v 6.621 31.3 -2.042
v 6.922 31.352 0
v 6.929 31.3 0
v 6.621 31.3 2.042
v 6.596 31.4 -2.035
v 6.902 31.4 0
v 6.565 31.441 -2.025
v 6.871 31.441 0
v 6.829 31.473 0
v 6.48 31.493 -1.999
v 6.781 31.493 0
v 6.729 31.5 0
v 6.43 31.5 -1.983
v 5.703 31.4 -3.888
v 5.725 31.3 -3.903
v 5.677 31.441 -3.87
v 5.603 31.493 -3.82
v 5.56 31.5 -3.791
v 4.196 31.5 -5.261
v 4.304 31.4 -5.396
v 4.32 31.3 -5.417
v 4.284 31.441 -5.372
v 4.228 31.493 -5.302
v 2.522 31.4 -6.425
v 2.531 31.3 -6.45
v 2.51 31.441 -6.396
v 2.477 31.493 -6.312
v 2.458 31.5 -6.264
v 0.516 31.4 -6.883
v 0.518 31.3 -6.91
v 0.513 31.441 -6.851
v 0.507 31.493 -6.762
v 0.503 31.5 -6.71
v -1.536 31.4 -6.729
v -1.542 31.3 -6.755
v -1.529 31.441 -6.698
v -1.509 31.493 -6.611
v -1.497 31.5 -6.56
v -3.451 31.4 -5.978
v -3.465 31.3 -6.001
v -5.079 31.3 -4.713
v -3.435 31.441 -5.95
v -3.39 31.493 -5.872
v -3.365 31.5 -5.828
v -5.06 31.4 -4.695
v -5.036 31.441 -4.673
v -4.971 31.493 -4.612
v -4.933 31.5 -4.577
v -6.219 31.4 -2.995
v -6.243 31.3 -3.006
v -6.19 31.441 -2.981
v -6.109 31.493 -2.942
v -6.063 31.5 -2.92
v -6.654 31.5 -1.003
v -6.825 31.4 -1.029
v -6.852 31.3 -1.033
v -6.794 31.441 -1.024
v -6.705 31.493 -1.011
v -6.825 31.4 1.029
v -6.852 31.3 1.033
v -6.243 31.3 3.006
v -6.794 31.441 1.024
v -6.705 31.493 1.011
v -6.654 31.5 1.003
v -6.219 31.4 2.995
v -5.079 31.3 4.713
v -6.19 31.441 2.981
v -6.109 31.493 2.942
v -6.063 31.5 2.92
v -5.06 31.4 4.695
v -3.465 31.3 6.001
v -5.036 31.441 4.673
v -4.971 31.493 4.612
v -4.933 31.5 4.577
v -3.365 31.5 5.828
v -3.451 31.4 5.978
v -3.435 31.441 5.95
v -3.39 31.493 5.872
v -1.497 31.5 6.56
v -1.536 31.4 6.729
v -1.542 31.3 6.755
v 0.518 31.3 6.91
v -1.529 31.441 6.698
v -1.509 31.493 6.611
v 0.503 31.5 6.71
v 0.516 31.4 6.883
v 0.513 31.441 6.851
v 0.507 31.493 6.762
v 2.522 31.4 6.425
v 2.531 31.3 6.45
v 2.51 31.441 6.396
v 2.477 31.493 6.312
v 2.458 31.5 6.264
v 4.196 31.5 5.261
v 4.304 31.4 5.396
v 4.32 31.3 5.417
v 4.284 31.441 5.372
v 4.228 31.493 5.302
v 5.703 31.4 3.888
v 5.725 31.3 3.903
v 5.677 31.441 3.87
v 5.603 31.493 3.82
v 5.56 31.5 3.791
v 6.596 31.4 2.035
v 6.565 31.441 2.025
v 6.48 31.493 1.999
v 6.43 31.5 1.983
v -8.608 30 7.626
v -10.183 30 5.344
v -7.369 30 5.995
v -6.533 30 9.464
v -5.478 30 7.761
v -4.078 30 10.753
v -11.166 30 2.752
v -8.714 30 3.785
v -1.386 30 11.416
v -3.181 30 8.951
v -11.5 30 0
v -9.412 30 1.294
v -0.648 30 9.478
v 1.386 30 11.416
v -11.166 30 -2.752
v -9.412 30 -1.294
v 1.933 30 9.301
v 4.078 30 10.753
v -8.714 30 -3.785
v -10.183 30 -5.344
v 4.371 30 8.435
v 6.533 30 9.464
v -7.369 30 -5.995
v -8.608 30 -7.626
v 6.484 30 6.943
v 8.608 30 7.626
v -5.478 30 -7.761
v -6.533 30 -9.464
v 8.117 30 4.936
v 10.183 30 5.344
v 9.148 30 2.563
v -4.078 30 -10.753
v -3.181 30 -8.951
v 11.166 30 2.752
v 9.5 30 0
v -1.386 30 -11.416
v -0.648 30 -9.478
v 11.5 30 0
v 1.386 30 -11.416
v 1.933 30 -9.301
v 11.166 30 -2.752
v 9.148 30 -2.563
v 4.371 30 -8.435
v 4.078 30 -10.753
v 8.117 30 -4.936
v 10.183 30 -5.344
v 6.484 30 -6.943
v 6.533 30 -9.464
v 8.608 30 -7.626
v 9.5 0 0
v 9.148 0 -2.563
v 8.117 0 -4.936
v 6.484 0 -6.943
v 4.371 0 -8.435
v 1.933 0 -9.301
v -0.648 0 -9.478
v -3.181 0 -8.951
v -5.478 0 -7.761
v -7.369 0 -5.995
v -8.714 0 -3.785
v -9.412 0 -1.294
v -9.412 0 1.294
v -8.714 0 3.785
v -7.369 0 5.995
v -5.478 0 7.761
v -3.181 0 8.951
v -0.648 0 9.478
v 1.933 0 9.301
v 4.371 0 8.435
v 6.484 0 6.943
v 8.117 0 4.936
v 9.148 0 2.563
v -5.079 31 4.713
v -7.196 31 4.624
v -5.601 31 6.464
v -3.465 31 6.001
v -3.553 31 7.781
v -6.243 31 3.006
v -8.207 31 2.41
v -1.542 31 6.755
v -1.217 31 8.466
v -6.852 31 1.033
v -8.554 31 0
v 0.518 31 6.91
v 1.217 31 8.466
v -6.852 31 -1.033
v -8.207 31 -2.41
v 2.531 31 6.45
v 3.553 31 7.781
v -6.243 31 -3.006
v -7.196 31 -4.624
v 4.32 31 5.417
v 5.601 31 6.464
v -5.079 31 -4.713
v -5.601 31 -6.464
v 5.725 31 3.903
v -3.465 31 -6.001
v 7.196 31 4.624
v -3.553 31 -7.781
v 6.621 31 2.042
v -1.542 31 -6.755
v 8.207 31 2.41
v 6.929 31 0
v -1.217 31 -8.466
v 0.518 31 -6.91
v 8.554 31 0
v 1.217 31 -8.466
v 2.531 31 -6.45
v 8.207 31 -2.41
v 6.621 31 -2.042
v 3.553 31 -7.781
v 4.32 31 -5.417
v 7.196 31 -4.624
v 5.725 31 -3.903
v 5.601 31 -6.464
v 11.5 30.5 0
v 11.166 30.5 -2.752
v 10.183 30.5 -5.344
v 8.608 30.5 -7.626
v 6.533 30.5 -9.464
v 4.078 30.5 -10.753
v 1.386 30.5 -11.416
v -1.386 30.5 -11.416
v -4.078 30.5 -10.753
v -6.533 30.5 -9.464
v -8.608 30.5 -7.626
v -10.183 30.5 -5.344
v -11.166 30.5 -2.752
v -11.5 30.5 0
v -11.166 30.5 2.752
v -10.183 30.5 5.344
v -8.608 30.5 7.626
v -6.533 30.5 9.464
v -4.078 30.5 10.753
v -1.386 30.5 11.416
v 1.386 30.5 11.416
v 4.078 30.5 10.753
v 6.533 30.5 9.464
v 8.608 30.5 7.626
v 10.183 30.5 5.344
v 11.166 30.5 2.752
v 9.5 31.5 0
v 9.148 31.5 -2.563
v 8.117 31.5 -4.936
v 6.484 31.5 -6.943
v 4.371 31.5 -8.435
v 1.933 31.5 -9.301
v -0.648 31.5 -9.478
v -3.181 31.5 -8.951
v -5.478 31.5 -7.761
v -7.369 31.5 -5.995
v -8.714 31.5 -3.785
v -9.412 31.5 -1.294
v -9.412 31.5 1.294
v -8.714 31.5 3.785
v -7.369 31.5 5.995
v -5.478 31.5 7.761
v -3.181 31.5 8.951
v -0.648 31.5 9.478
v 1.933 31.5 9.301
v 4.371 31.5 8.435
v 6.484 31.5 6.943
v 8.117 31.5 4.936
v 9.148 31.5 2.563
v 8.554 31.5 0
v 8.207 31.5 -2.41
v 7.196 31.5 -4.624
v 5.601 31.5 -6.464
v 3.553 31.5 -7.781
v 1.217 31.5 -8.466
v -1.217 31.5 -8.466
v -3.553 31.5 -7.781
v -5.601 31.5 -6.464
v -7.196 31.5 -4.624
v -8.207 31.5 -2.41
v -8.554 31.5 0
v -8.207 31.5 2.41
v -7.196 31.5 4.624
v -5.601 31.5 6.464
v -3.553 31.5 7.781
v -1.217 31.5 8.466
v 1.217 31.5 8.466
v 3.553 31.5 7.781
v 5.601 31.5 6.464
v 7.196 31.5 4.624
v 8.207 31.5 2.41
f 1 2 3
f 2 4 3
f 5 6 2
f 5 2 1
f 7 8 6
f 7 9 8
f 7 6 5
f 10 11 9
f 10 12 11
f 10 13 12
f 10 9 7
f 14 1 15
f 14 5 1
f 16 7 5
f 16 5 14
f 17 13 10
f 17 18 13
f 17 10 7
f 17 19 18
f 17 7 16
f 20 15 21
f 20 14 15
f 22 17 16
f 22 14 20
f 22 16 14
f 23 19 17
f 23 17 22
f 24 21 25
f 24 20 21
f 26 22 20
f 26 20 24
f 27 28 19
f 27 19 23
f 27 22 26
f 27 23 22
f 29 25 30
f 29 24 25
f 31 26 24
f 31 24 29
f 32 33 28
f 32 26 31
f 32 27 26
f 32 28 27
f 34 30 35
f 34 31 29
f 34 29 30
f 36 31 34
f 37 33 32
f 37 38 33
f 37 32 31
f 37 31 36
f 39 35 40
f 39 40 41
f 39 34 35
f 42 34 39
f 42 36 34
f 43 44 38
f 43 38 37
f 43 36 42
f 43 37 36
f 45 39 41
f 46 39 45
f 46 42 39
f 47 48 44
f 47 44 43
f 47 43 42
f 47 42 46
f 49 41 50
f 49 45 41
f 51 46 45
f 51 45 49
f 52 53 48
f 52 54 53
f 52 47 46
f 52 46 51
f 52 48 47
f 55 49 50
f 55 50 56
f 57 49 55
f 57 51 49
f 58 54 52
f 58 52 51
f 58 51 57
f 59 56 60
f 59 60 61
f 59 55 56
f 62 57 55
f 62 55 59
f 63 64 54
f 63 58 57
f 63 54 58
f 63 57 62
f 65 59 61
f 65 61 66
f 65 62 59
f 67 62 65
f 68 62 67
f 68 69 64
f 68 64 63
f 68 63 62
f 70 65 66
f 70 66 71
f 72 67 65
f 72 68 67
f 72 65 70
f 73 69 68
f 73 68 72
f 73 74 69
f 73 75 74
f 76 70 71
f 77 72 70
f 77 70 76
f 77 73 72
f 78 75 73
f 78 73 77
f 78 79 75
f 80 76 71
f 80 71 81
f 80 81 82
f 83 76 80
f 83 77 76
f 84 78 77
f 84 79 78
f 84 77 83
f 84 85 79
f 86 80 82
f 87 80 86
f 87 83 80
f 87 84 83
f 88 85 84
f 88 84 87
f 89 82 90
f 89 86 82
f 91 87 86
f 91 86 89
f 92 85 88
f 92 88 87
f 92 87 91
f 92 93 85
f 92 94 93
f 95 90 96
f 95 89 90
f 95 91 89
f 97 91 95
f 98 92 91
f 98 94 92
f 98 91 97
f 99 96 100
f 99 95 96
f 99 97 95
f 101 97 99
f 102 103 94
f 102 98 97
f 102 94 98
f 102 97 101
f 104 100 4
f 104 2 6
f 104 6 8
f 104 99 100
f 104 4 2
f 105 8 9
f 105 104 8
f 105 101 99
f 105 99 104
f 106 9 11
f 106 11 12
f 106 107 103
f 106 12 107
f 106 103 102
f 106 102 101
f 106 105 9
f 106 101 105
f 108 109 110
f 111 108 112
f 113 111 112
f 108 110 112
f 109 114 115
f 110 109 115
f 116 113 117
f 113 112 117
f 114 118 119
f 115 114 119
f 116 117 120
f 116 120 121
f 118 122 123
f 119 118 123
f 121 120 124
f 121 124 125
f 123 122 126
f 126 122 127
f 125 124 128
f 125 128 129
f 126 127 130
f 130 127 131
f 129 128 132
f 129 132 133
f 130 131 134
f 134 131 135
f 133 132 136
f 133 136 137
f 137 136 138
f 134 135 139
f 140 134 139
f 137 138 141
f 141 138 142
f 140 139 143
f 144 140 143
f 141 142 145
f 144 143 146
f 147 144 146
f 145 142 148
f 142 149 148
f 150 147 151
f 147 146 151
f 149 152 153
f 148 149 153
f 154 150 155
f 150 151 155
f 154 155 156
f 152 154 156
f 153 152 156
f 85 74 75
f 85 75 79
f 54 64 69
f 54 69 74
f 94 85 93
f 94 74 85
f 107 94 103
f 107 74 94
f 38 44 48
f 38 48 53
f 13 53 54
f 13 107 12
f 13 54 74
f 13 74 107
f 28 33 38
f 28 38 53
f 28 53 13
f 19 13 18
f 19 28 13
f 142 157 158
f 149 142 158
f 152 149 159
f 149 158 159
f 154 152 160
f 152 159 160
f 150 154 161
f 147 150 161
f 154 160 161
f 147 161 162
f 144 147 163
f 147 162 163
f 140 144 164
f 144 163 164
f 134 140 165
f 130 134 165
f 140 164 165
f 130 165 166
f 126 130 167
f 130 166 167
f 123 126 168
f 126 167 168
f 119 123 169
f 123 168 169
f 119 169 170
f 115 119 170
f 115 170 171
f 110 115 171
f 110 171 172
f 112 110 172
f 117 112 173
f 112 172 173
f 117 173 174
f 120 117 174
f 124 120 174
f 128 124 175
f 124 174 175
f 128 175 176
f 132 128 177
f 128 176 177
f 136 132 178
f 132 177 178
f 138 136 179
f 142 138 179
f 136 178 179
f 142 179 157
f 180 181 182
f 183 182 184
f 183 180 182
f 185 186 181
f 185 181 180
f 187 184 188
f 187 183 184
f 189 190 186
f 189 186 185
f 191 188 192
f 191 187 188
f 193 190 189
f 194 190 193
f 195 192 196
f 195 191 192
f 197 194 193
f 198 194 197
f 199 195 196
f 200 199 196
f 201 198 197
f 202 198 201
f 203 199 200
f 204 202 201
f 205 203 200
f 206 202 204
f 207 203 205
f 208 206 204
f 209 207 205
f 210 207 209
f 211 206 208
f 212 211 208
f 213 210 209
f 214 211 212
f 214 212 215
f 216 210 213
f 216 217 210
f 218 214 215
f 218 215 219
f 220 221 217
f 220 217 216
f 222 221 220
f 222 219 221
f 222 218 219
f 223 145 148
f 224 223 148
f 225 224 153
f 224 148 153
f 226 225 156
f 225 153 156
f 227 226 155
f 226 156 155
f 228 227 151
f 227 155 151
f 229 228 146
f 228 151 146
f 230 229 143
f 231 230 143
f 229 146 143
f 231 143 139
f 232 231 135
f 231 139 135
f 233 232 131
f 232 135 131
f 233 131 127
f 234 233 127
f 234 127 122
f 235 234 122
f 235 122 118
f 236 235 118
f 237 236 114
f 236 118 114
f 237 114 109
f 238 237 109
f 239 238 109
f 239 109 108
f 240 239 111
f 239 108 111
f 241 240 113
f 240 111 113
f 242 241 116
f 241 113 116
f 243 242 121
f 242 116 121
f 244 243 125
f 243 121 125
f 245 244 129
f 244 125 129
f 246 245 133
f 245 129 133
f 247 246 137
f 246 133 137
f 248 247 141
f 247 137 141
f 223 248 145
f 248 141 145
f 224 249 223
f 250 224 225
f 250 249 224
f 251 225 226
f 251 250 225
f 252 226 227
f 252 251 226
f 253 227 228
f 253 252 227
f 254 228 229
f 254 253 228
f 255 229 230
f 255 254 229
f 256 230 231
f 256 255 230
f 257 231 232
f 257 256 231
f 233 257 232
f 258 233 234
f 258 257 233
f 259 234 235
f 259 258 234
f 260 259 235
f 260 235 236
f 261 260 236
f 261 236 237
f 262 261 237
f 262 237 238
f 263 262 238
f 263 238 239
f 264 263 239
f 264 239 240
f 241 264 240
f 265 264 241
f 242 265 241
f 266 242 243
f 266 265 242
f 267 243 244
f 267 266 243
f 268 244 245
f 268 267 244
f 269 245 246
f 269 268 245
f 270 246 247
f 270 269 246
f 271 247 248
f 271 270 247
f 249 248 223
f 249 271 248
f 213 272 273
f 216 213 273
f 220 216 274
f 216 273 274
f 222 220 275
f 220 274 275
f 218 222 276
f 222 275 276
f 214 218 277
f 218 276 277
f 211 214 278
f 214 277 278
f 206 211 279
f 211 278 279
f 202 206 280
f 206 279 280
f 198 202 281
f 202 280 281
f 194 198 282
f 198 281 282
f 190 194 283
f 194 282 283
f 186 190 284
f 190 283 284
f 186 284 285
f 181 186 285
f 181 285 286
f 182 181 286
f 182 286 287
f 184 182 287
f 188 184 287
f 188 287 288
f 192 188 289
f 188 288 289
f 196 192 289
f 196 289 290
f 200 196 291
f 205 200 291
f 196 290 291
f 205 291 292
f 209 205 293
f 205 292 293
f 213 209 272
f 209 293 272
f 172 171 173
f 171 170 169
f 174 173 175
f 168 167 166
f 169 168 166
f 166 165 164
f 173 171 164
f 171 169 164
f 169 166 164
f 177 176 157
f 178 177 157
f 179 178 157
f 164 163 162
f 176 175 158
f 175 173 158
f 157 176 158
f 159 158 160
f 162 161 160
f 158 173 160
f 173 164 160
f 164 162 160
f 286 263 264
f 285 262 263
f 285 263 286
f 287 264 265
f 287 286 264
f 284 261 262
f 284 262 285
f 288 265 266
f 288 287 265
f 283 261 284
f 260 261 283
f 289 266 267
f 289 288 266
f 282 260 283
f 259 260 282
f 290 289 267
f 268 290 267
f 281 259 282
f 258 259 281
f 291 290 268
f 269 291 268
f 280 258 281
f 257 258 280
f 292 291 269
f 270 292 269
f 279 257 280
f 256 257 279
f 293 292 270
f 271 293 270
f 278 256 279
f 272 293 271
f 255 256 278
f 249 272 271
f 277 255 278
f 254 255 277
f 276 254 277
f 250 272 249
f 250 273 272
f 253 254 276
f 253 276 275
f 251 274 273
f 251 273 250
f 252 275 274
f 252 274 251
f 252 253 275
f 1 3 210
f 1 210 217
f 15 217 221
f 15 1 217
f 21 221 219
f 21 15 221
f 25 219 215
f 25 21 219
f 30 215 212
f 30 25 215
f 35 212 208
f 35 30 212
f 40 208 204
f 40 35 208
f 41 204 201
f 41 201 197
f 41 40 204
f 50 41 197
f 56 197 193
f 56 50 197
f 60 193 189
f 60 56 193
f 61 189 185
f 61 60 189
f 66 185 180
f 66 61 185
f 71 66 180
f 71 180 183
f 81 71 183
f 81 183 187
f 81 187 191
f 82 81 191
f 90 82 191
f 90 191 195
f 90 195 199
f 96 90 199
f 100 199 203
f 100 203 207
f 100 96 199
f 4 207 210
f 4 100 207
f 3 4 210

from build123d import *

# Parameters (mm, degrees)
SKETCH_1_R          = 9.5
EXTRUDE_1_DEPTH     = 30
SKETCH_2_R          = 11.5
EXTRUDE_2_DEPTH     = 1.5
CHAMFER_1_SIZE      = 1
CHAMFER_1_SIZE2     = 2
SKETCH_3_R          = 8.553523617
SKETCH_3_R_2        = 6.929138855
CUT_EXTRUDE_1_DEPTH = 0.5
FILLET_1_R          = 0.2


with BuildPart() as part:
    # 草图1 → 凸台-拉伸1 (new body)
    with BuildSketch(Plane(origin=(0, 0, 0), x_dir=(1, 0, 0), z_dir=(0, 1, 0))):
        Circle(SKETCH_1_R)
    extrude(amount=EXTRUDE_1_DEPTH)

    # 草图2 → 凸台-拉伸2 (add)
    with BuildSketch(Plane(origin=(0, 30, 0), x_dir=(1, 0, 0), z_dir=(0, 1, 0))):
        Circle(SKETCH_2_R)
    extrude(amount=EXTRUDE_2_DEPTH)

    # 倒角1
    chamfer_1_edges = [part.edges().sort_by_distance(p)[0] for p in [
        (-11.5, 31.5, 0),
    ]]
    chamfer_1_side = [part.faces().sort_by_distance(p)[0] for p in [
        (-11.5, 30.75, 0),
    ]]
    chamfer(chamfer_1_edges, length=CHAMFER_1_SIZE, length2=CHAMFER_1_SIZE2, reference=chamfer_1_side[0])

    # 草图3 → 切除-拉伸1 (cut)
    with BuildSketch(Plane(origin=(0, 31.5, 0), x_dir=(1, 0, 0), z_dir=(0, 1, 0))):
        Circle(SKETCH_3_R)
        Circle(SKETCH_3_R_2, mode=Mode.SUBTRACT)
    extrude(amount=-CUT_EXTRUDE_1_DEPTH, mode=Mode.SUBTRACT)

    # 圆角1
    fillet_1_edges = [part.edges().sort_by_distance(p)[0] for p in [
        (-6.929138855, 31.5, 0),
    ]]
    fillet(fillet_1_edges, radius=FILLET_1_R)


solid = part.part
